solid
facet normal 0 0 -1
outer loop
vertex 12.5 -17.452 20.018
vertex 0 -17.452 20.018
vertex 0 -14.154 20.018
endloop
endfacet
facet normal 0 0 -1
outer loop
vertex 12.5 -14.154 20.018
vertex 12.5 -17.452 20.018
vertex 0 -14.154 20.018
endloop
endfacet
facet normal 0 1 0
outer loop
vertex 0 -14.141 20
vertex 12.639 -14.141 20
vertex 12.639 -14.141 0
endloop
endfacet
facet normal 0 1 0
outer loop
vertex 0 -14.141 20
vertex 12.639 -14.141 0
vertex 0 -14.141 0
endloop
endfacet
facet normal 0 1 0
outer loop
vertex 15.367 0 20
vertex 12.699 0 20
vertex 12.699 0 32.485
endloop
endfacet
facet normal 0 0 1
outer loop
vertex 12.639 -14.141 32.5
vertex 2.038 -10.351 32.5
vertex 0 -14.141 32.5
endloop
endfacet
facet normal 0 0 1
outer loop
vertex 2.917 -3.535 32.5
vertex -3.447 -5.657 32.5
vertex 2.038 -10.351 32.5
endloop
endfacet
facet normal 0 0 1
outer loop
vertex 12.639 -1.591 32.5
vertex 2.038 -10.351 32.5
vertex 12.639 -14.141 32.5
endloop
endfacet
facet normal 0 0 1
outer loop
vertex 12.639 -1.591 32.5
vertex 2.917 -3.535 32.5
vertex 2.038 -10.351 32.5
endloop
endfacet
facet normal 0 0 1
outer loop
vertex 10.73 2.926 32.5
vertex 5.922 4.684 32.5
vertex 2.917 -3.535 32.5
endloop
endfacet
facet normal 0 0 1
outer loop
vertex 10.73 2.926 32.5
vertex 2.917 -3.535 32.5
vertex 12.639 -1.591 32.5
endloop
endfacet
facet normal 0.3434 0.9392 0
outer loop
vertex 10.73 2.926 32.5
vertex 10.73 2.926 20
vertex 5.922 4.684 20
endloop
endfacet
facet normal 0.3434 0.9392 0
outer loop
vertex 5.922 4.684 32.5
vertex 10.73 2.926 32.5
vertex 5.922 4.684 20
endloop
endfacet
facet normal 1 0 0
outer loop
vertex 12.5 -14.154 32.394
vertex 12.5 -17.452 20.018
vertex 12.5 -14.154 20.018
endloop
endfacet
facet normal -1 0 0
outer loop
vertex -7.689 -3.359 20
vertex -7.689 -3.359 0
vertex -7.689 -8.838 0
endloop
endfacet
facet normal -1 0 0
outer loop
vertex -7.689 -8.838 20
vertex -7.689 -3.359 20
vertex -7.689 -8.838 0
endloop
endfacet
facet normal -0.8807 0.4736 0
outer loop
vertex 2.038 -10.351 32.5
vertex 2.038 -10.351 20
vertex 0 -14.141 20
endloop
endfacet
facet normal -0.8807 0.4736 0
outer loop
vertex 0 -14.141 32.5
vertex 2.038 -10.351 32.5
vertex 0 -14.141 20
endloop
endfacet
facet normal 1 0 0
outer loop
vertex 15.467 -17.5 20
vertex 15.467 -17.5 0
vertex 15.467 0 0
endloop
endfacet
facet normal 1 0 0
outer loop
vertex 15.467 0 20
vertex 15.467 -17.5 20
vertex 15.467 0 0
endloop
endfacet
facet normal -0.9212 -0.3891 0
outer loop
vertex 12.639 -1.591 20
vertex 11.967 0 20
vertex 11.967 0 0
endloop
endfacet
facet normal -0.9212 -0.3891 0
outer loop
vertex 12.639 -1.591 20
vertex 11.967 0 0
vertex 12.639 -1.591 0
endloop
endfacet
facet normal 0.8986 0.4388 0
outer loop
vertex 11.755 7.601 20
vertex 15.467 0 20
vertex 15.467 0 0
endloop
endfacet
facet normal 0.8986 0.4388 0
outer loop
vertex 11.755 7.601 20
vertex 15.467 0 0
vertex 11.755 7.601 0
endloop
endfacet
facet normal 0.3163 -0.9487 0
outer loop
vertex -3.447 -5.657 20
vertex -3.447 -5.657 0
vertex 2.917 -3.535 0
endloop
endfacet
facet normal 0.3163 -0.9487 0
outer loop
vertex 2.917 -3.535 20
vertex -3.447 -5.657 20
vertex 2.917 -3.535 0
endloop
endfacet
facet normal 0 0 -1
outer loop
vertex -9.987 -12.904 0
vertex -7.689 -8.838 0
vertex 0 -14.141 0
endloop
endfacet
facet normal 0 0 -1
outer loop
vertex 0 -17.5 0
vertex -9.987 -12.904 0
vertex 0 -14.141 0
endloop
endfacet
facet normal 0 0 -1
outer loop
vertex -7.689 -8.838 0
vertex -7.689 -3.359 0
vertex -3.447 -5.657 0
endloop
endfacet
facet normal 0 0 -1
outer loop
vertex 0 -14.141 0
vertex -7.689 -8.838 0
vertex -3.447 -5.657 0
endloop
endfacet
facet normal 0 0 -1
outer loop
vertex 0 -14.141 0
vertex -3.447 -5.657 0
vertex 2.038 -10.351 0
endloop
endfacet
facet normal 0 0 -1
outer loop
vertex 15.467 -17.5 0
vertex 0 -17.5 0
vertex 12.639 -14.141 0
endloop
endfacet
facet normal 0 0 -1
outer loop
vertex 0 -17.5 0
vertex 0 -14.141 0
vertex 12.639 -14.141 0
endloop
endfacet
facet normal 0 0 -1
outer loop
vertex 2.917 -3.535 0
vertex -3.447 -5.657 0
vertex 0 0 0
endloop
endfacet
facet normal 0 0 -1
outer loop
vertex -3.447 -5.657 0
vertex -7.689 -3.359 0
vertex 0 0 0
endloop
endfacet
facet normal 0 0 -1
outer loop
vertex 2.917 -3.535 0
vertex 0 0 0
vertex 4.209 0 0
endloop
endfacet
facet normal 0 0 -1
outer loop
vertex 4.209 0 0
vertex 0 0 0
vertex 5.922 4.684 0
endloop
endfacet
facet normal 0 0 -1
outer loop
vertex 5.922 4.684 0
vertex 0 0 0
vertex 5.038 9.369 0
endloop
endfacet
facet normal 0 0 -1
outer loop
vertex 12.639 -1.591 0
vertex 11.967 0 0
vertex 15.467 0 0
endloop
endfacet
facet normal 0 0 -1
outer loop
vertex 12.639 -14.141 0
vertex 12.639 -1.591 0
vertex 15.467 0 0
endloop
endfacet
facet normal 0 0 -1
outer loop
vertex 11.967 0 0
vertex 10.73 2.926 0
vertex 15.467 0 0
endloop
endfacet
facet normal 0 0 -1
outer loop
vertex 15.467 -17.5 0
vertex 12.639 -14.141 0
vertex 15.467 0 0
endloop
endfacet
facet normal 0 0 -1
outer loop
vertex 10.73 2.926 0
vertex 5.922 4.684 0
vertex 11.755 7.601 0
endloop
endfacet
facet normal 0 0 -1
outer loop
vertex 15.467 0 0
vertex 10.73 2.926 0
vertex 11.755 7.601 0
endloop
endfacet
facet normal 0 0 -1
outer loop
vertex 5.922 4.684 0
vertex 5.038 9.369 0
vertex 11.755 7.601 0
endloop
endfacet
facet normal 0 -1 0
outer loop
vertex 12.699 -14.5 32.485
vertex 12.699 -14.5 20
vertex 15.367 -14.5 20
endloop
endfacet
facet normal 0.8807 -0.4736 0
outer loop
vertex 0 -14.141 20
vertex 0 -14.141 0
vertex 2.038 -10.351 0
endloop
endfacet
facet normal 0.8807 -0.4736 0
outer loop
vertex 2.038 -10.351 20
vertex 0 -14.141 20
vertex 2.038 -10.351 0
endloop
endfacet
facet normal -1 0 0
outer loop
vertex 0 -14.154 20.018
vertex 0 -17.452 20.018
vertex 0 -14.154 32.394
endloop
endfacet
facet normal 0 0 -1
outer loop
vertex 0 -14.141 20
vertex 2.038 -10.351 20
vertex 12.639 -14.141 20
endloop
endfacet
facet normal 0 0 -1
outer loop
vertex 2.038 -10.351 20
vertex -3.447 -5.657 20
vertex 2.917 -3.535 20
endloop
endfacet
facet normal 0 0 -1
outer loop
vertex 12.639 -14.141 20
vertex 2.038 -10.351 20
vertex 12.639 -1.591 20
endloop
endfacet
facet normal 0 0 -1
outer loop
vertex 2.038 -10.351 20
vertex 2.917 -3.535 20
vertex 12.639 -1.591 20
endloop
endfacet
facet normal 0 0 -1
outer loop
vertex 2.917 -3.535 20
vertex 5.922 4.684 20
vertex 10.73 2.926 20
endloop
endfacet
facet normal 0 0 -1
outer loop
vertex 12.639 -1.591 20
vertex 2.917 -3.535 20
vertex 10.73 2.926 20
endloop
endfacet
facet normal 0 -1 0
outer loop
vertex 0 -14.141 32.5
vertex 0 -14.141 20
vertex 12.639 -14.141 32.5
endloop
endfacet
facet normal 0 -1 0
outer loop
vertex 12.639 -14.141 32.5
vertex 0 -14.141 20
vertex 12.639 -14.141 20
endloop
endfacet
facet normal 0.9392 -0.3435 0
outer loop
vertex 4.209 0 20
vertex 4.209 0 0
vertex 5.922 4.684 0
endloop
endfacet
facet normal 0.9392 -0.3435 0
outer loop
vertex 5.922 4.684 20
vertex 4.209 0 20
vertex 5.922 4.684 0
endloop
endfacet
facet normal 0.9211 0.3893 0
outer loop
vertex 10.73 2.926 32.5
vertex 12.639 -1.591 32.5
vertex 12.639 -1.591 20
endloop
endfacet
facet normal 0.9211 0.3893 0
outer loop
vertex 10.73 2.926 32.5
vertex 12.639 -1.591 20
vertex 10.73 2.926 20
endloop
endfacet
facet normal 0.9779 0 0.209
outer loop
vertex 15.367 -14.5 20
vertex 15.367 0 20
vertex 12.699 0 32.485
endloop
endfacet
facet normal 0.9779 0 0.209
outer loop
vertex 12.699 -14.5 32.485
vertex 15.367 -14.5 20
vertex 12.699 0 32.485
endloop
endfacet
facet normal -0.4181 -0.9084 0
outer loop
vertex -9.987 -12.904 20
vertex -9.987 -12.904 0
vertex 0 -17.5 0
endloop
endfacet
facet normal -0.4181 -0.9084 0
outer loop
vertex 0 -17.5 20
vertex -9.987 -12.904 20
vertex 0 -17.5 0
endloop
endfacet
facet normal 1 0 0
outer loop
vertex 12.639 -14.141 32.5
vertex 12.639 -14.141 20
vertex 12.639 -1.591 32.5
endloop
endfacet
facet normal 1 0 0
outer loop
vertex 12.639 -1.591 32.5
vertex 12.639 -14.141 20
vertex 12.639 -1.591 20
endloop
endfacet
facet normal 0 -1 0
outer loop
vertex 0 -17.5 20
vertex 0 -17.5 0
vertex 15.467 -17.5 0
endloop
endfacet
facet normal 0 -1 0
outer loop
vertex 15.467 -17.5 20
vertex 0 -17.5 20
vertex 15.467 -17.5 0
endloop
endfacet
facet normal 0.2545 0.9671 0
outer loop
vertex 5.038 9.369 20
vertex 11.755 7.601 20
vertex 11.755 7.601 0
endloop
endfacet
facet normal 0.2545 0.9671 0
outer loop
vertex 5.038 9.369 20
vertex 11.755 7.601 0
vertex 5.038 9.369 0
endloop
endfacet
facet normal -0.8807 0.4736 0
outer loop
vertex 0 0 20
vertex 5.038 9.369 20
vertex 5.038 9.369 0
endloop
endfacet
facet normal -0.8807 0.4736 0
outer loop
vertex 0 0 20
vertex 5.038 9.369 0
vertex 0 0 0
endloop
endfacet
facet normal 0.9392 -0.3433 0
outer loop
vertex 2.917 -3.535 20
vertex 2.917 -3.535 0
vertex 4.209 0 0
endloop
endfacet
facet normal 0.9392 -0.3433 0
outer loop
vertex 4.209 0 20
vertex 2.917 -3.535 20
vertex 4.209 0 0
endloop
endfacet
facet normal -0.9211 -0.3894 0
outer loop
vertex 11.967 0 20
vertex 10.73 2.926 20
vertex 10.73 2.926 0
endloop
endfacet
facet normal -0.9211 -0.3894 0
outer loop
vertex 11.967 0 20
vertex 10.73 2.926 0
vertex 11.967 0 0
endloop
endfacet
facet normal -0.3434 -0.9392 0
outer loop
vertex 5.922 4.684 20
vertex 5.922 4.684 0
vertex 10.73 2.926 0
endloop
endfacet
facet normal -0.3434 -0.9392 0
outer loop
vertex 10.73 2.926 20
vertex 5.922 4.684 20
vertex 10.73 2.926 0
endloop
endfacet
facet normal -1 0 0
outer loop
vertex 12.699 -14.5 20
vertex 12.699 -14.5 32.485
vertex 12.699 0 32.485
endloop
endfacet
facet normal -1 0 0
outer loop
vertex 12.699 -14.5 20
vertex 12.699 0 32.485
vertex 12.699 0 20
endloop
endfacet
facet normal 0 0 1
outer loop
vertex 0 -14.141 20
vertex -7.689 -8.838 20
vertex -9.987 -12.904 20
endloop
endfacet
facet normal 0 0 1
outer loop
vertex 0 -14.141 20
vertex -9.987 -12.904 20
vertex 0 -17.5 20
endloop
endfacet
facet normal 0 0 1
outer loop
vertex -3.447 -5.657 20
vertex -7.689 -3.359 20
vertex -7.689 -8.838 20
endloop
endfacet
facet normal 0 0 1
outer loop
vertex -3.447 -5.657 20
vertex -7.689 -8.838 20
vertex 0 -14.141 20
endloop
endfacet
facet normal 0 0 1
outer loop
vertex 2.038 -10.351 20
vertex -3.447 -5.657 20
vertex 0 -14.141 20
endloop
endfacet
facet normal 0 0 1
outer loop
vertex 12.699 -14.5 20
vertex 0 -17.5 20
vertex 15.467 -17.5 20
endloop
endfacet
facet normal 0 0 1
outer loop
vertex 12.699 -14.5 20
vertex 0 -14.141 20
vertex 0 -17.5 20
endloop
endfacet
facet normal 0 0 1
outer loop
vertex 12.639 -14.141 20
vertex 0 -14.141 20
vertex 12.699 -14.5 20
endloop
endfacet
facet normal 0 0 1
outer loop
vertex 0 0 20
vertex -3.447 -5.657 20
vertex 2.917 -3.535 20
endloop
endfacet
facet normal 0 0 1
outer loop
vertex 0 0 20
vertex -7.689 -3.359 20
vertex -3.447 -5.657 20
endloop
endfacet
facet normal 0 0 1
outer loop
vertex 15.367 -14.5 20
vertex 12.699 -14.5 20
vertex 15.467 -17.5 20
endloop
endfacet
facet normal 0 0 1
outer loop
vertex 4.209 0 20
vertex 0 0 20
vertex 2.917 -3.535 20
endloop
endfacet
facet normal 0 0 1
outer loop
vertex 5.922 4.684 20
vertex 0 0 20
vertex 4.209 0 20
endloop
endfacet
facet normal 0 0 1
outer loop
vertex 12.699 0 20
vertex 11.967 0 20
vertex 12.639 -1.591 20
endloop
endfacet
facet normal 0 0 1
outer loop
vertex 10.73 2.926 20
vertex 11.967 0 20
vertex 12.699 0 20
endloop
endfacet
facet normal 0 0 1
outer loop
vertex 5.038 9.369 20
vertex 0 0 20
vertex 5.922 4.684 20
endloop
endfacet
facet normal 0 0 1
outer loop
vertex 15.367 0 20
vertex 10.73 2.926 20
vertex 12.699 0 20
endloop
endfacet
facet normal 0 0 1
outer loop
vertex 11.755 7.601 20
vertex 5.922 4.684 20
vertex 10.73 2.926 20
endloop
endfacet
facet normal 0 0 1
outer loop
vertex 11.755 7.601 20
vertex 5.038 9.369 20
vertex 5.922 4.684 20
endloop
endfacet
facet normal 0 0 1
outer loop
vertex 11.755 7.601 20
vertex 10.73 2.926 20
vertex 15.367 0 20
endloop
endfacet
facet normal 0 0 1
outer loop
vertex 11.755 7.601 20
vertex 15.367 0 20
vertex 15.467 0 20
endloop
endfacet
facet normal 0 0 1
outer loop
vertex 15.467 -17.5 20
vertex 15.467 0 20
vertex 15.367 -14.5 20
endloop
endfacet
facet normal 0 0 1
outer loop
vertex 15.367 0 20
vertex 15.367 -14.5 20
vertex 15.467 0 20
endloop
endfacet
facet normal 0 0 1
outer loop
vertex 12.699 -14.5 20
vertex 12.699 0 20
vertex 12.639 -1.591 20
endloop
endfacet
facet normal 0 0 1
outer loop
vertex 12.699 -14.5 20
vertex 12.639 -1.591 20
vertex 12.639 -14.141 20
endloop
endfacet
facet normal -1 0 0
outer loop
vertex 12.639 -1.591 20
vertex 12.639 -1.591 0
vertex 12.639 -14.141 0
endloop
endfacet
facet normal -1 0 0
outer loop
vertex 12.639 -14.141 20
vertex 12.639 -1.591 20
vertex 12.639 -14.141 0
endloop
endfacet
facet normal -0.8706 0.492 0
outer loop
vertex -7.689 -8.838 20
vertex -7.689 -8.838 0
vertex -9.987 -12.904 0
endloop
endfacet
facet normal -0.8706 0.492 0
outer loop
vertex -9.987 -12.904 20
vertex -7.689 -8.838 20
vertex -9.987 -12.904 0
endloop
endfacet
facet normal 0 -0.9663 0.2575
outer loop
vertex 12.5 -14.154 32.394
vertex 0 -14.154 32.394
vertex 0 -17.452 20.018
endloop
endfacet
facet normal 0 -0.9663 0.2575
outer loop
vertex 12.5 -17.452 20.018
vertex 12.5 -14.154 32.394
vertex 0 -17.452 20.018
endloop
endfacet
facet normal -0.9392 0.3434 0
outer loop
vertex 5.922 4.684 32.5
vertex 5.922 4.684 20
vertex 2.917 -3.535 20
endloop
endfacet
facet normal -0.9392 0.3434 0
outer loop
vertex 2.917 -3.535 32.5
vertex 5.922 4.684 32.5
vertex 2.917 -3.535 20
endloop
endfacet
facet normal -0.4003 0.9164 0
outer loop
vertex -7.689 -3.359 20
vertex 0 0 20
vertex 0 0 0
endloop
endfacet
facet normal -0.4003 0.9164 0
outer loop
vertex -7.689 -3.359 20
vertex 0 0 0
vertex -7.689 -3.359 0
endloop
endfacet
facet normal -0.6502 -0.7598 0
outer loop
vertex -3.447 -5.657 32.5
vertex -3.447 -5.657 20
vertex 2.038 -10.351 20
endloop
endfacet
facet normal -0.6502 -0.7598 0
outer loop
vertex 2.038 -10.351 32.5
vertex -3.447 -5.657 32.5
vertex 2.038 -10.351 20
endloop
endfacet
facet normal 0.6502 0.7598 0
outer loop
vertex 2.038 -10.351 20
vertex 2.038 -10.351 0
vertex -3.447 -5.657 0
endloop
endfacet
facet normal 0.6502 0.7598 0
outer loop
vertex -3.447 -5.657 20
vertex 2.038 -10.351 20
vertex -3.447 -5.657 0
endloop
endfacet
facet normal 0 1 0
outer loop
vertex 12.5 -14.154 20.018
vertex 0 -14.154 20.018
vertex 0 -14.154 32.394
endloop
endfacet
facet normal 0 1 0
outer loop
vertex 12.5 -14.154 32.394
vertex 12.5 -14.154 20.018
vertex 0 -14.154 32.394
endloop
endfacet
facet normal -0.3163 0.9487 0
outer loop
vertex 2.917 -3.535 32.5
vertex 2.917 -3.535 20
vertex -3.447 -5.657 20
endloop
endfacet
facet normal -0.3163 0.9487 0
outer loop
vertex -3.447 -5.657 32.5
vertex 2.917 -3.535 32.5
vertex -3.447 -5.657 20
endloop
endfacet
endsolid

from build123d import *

# Parameters (mm, degrees)
F1_DEPTH = 20
F3_DEPTH = 12.5
F5_DEPTH = 12.5
F7_DEPTH = 14.5


with BuildPart() as f1:
    # F0 (on Top) → F1 (new body)
    with BuildSketch(Plane.XY):
        Polygon((4.2091628588, 0), (0, 0), (-7.6893941317, -3.3585857784), (-7.6893941317, -8.8383838224), (-9.9873745708, -12.9040412375), (0, -17.5), (15.4671736725, -17.5), (15.4671736725, 0), (11.9667165624, 0), (12.6388881837, -1.5909090669), (12.6388881837, -14.1414147504), (0, -14.1414147504), (2.0384542777, -10.350604583), (-3.4469682786, -5.6565662175), (2.9166682534, -3.5353536876), align=None)
        Polygon((5.0378784032, 9.3686872854), (0, 0), (4.2091628588, 0), (5.9217182135, 4.6843436427), (10.7303036149, 2.92636658), (11.9667165624, 0), (15.4671736725, 0), (11.7550499601, 7.6010103094), align=None)
    extrude(amount=F1_DEPTH)

    # F6 (on Front) → F7 (join)
    with BuildSketch(Plane.XZ):
        Polygon((12.6992398873, 19.9890304357), (15.3688639402, 19.9890304357), (12.6992398873, 32.4851460755), align=None)
    extrude(amount=F7_DEPTH)


with BuildPart() as f3:
    # F2 (on face) → F3 (new body)
    with BuildSketch(Plane.XY.offset(20)):
        Polygon((2.9166682534, -3.5353536876), (-3.4469682786, -5.6565662175), (2.0384542777, -10.350604583), (0, -14.1414147504), (12.6388881837, -14.1414147504), (12.6388881837, -1.5909090669), (10.7303036149, 2.92636658), (5.9217182135, 4.6843436427), align=None)
    extrude(amount=F3_DEPTH)


with BuildPart() as f5:
    # F4 (on Right) → F5 (new body)
    with BuildSketch(Plane.YZ):
        Polygon((-14.153862372, 20.0179181993), (-14.153862372, 32.3935039341), (-17.4522325397, 20.0179181993), align=None)
    extrude(amount=F5_DEPTH)


solid = Compound([f1.part, f3.part, f5.part])
